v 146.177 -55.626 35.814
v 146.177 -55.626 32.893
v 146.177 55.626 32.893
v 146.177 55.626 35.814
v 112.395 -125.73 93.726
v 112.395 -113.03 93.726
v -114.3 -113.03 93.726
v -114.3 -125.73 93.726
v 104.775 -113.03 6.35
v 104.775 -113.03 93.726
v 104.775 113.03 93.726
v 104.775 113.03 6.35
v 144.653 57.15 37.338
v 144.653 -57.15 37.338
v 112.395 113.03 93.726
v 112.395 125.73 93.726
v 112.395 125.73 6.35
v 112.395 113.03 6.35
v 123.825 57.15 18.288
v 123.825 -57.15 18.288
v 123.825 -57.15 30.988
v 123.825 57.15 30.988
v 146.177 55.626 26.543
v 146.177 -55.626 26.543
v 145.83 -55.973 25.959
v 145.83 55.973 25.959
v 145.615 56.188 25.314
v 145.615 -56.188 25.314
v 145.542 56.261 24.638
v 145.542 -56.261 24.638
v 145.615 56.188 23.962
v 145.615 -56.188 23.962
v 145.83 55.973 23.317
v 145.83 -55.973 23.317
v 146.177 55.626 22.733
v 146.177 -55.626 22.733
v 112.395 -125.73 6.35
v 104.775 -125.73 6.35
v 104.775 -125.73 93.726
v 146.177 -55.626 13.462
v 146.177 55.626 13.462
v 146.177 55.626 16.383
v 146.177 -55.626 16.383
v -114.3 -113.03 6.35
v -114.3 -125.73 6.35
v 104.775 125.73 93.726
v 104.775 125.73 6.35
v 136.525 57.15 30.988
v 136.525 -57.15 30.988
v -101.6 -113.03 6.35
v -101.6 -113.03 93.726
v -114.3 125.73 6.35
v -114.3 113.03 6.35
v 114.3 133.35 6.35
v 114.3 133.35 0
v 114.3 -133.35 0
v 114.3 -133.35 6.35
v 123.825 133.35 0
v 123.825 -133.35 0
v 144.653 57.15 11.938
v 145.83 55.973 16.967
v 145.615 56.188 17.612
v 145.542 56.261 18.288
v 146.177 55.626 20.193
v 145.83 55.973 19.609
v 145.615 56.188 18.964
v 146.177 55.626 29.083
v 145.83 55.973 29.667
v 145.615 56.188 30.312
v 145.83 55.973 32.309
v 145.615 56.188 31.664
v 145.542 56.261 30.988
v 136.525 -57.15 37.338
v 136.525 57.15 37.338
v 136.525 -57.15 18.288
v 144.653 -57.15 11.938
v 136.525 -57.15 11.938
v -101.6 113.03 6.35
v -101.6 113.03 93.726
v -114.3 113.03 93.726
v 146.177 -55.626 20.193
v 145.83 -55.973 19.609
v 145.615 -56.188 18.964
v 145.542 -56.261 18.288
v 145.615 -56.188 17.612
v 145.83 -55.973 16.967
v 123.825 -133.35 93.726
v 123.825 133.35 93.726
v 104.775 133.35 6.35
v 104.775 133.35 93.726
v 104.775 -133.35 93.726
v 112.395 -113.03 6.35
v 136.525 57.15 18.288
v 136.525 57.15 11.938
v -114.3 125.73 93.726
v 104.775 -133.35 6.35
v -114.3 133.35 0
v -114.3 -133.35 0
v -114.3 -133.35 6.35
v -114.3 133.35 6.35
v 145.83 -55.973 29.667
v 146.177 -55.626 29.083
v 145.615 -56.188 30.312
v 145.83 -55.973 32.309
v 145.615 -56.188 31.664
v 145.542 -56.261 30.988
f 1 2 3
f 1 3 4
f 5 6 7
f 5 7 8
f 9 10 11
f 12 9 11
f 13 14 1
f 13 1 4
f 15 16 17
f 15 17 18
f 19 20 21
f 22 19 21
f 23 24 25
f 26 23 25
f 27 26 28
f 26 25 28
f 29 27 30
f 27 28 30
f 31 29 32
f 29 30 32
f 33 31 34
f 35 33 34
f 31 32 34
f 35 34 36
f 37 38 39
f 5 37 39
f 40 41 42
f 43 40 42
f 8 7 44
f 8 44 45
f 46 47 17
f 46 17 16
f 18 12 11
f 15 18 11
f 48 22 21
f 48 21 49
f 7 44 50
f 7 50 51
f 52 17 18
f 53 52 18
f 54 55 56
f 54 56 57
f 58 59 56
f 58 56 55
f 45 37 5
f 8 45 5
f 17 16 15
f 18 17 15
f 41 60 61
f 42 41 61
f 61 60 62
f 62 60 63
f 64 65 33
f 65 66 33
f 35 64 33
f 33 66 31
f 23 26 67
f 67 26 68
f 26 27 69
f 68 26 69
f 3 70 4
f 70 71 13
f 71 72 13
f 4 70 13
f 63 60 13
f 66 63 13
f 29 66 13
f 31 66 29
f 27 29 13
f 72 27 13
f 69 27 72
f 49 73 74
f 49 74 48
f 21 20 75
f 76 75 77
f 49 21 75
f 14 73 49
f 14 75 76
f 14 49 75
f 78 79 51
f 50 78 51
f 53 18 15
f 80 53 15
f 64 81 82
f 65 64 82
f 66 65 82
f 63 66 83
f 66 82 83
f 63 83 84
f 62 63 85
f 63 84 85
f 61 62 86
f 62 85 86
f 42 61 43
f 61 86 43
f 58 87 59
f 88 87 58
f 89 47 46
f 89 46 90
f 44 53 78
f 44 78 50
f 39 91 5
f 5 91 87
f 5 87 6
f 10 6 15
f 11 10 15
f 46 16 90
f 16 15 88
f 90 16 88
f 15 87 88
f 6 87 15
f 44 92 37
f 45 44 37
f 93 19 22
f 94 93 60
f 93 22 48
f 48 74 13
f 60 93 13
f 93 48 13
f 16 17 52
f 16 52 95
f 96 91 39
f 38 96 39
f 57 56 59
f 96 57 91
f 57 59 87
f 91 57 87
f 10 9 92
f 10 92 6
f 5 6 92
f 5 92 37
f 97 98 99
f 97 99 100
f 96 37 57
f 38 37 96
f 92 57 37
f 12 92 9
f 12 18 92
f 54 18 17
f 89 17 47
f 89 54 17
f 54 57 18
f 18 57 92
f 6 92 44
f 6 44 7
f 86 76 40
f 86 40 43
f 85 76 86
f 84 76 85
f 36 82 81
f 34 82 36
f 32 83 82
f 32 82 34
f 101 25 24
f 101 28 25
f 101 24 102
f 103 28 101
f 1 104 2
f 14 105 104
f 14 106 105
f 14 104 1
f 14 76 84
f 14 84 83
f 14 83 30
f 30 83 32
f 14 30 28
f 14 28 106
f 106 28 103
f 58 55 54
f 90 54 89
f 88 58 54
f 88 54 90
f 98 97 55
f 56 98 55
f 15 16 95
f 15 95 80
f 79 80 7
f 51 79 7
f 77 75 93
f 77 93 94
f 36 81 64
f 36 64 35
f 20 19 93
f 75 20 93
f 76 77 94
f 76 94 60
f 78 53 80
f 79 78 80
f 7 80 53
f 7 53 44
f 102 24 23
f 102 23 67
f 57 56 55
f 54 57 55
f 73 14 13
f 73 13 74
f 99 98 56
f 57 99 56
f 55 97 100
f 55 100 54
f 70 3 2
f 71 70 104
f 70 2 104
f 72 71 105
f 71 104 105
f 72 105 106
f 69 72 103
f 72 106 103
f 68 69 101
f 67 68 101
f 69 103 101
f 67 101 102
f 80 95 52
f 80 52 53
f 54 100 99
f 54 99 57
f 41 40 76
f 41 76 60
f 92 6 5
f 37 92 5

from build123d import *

# Parameters (mm, degrees)
F0_W      = 228.6
F0_H      = 266.7
F1_DEPTH  = 6.35
F2_W      = 266.7
F2_H      = 93.726
F3_DEPTH  = 9.525
F4_W      = 12.7
F4_H      = 87.376
F5_DEPTH  = 7.62
F6_W      = 9.525
F6_H      = 6.35
F7_DEPTH  = 266.701
F8_DEPTH  = 226.695
F9_W      = 226.06
F9_H      = 87.376
F10_DEPTH = 12.7
F12_W     = 12.7
F12_H     = 12.7
F13_DEPTH = 114.3
F14_SIZE  = 1.524
F16_DEPTH = 190.501


with BuildPart() as f1:
    # F0 (on Top) → F1 (new body)
    with BuildSketch(Plane.XY):
        Rectangle(F0_W, F0_H)
    extrude(amount=F1_DEPTH)


with BuildPart() as f3:
    # F2 (on face) → F3 (new body, symmetric)
    with BuildSketch(Plane.YZ.offset(114.3)):
        with Locations((0, 46.863)):
            Rectangle(F2_W, F2_H)
    extrude(amount=F3_DEPTH, both=True)

    # F4 (on face) → F5 (cut)
    with BuildSketch(Plane(origin=(104.775, 0, 0), x_dir=(0, -1, 0), z_dir=(-1, 0, 0))):
        with Locations((-119.38, 50.038)):
            Rectangle(F4_W, F4_H)
        with Locations((119.38, 50.038)):
            Rectangle(F4_W, F4_H)
    extrude(amount=-F5_DEPTH, mode=Mode.SUBTRACT)

    # F6 (on face) → F7 (cut, through all)
    with BuildSketch(Plane(origin=(0, 133.35, 0), x_dir=(-1, 0, 0), z_dir=(0, 1, 0))):
        with Locations((-109.5375, 3.175)):
            Rectangle(F6_W, F6_H)
    extrude(amount=-F7_DEPTH, mode=Mode.SUBTRACT)


with BuildPart() as f8:
    # F8 (new, through all): a face of the model
    f8_faces = [f3.part.faces().sort_by_distance(p)[0] for p in [
        (112.395, 119.38, 50.038),
    ]]
    extrude(f8_faces, amount=F8_DEPTH)


with BuildPart() as f8b:
    # F8#2 (new, through all): a face of the model
    f8_2_faces = [f3.part.faces().sort_by_distance(p)[0] for p in [
        (112.395, -119.38, 50.038),
    ]]
    extrude(f8_2_faces, amount=F8_DEPTH)


with BuildPart() as f10:
    # F9 (on face) → F10 (new body)
    with BuildSketch(Plane(origin=(-114.3, 0, 0), x_dir=(0, -1, 0), z_dir=(-1, 0, 0))):
        with Locations((0, 50.038)):
            Rectangle(F9_W, F9_H)
    extrude(amount=-F10_DEPTH)


with BuildPart() as f13:
    # F12 (on offset) → F13 (new body)
    with BuildSketch(Plane.XZ.offset(57.15)):
        with Locations((130.175, 24.638)):
            Rectangle(F12_W, F12_H)
        Polygon((136.525, 37.338), (136.525, 30.988), (136.525, 18.288), (136.525, 11.938), (146.177, 11.938), (146.177, 37.338), align=None)
    extrude(amount=-F13_DEPTH)

    # F14
    f14_edges = [f13.edges().sort_by_distance(p)[0] for p in [
        (146.177, 0, 11.938),
        (146.177, 0, 37.338),
        (146.177, -57.15, 24.638),
        (146.177, 57.15, 24.638),
    ]]
    chamfer(f14_edges, length=F14_SIZE)

    # F15 (on face) → F16 (cut, through all)
    with BuildSketch(Plane.XZ.offset(57.15)):
        with BuildLine():
            ThreePointArc((151.892, 30.988), (149.7210231571, 34.0000694713), (146.177, 32.893))
            Line((146.177, 32.893), (146.177, 29.083))
            ThreePointArc((146.177, 29.083), (147.2970968343, 28.1481936686), (148.717, 27.813))
            ThreePointArc((148.717, 27.813), (150.9620640303, 28.7429359697), (151.892, 30.988))
        make_face()
        with BuildLine():
            Line((146.177, 29.083), (146.177, 32.893))
            ThreePointArc((146.177, 32.893), (145.542, 30.988), (146.177, 29.083))
        make_face()
        with BuildLine():
            ThreePointArc((148.717, 27.813), (147.2970968343, 28.1481936686), (146.177, 29.083))
            Line((146.177, 29.083), (146.177, 26.543))
            ThreePointArc((146.177, 26.543), (147.2970968343, 27.4778063314), (148.717, 27.813))
        make_face()
        with BuildLine():
            ThreePointArc((148.717, 27.813), (147.2970968343, 27.4778063314), (146.177, 26.543))
            Line((146.177, 26.543), (146.177, 22.733))
            ThreePointArc((146.177, 22.733), (147.2970968343, 21.7981936686), (148.717, 21.463))
            ThreePointArc((148.717, 21.463), (150.9620640303, 22.3929359697), (151.892, 24.638))
            ThreePointArc((151.892, 24.638), (150.9620640303, 26.8830640303), (148.717, 27.813))
        make_face()
        with BuildLine():
            Line((146.177, 22.733), (146.177, 26.543))
            ThreePointArc((146.177, 26.543), (145.542, 24.638), (146.177, 22.733))
        make_face()
        with BuildLine():
            ThreePointArc((148.717, 21.463), (147.2970968343, 21.7981936686), (146.177, 22.733))
            Line((146.177, 22.733), (146.177, 20.193))
            ThreePointArc((146.177, 20.193), (147.2970968343, 21.1278063314), (148.717, 21.463))
        make_face()
        with BuildLine():
            ThreePointArc((148.717, 21.463), (147.2970968343, 21.1278063314), (146.177, 20.193))
            Line((146.177, 20.193), (146.177, 16.383))
            ThreePointArc((146.177, 16.383), (149.7210231571, 15.2759305287), (151.892, 18.288))
            ThreePointArc((151.892, 18.288), (150.9620640303, 20.5330640303), (148.717, 21.463))
        make_face()
        with BuildLine():
            Line((146.177, 16.383), (146.177, 20.193))
            ThreePointArc((146.177, 20.193), (145.542, 18.288), (146.177, 16.383))
        make_face()
    extrude(amount=-F16_DEPTH, mode=Mode.SUBTRACT)


solid = Compound([f1.part, f3.part, f8.part, f8b.part, f10.part, f13.part])
